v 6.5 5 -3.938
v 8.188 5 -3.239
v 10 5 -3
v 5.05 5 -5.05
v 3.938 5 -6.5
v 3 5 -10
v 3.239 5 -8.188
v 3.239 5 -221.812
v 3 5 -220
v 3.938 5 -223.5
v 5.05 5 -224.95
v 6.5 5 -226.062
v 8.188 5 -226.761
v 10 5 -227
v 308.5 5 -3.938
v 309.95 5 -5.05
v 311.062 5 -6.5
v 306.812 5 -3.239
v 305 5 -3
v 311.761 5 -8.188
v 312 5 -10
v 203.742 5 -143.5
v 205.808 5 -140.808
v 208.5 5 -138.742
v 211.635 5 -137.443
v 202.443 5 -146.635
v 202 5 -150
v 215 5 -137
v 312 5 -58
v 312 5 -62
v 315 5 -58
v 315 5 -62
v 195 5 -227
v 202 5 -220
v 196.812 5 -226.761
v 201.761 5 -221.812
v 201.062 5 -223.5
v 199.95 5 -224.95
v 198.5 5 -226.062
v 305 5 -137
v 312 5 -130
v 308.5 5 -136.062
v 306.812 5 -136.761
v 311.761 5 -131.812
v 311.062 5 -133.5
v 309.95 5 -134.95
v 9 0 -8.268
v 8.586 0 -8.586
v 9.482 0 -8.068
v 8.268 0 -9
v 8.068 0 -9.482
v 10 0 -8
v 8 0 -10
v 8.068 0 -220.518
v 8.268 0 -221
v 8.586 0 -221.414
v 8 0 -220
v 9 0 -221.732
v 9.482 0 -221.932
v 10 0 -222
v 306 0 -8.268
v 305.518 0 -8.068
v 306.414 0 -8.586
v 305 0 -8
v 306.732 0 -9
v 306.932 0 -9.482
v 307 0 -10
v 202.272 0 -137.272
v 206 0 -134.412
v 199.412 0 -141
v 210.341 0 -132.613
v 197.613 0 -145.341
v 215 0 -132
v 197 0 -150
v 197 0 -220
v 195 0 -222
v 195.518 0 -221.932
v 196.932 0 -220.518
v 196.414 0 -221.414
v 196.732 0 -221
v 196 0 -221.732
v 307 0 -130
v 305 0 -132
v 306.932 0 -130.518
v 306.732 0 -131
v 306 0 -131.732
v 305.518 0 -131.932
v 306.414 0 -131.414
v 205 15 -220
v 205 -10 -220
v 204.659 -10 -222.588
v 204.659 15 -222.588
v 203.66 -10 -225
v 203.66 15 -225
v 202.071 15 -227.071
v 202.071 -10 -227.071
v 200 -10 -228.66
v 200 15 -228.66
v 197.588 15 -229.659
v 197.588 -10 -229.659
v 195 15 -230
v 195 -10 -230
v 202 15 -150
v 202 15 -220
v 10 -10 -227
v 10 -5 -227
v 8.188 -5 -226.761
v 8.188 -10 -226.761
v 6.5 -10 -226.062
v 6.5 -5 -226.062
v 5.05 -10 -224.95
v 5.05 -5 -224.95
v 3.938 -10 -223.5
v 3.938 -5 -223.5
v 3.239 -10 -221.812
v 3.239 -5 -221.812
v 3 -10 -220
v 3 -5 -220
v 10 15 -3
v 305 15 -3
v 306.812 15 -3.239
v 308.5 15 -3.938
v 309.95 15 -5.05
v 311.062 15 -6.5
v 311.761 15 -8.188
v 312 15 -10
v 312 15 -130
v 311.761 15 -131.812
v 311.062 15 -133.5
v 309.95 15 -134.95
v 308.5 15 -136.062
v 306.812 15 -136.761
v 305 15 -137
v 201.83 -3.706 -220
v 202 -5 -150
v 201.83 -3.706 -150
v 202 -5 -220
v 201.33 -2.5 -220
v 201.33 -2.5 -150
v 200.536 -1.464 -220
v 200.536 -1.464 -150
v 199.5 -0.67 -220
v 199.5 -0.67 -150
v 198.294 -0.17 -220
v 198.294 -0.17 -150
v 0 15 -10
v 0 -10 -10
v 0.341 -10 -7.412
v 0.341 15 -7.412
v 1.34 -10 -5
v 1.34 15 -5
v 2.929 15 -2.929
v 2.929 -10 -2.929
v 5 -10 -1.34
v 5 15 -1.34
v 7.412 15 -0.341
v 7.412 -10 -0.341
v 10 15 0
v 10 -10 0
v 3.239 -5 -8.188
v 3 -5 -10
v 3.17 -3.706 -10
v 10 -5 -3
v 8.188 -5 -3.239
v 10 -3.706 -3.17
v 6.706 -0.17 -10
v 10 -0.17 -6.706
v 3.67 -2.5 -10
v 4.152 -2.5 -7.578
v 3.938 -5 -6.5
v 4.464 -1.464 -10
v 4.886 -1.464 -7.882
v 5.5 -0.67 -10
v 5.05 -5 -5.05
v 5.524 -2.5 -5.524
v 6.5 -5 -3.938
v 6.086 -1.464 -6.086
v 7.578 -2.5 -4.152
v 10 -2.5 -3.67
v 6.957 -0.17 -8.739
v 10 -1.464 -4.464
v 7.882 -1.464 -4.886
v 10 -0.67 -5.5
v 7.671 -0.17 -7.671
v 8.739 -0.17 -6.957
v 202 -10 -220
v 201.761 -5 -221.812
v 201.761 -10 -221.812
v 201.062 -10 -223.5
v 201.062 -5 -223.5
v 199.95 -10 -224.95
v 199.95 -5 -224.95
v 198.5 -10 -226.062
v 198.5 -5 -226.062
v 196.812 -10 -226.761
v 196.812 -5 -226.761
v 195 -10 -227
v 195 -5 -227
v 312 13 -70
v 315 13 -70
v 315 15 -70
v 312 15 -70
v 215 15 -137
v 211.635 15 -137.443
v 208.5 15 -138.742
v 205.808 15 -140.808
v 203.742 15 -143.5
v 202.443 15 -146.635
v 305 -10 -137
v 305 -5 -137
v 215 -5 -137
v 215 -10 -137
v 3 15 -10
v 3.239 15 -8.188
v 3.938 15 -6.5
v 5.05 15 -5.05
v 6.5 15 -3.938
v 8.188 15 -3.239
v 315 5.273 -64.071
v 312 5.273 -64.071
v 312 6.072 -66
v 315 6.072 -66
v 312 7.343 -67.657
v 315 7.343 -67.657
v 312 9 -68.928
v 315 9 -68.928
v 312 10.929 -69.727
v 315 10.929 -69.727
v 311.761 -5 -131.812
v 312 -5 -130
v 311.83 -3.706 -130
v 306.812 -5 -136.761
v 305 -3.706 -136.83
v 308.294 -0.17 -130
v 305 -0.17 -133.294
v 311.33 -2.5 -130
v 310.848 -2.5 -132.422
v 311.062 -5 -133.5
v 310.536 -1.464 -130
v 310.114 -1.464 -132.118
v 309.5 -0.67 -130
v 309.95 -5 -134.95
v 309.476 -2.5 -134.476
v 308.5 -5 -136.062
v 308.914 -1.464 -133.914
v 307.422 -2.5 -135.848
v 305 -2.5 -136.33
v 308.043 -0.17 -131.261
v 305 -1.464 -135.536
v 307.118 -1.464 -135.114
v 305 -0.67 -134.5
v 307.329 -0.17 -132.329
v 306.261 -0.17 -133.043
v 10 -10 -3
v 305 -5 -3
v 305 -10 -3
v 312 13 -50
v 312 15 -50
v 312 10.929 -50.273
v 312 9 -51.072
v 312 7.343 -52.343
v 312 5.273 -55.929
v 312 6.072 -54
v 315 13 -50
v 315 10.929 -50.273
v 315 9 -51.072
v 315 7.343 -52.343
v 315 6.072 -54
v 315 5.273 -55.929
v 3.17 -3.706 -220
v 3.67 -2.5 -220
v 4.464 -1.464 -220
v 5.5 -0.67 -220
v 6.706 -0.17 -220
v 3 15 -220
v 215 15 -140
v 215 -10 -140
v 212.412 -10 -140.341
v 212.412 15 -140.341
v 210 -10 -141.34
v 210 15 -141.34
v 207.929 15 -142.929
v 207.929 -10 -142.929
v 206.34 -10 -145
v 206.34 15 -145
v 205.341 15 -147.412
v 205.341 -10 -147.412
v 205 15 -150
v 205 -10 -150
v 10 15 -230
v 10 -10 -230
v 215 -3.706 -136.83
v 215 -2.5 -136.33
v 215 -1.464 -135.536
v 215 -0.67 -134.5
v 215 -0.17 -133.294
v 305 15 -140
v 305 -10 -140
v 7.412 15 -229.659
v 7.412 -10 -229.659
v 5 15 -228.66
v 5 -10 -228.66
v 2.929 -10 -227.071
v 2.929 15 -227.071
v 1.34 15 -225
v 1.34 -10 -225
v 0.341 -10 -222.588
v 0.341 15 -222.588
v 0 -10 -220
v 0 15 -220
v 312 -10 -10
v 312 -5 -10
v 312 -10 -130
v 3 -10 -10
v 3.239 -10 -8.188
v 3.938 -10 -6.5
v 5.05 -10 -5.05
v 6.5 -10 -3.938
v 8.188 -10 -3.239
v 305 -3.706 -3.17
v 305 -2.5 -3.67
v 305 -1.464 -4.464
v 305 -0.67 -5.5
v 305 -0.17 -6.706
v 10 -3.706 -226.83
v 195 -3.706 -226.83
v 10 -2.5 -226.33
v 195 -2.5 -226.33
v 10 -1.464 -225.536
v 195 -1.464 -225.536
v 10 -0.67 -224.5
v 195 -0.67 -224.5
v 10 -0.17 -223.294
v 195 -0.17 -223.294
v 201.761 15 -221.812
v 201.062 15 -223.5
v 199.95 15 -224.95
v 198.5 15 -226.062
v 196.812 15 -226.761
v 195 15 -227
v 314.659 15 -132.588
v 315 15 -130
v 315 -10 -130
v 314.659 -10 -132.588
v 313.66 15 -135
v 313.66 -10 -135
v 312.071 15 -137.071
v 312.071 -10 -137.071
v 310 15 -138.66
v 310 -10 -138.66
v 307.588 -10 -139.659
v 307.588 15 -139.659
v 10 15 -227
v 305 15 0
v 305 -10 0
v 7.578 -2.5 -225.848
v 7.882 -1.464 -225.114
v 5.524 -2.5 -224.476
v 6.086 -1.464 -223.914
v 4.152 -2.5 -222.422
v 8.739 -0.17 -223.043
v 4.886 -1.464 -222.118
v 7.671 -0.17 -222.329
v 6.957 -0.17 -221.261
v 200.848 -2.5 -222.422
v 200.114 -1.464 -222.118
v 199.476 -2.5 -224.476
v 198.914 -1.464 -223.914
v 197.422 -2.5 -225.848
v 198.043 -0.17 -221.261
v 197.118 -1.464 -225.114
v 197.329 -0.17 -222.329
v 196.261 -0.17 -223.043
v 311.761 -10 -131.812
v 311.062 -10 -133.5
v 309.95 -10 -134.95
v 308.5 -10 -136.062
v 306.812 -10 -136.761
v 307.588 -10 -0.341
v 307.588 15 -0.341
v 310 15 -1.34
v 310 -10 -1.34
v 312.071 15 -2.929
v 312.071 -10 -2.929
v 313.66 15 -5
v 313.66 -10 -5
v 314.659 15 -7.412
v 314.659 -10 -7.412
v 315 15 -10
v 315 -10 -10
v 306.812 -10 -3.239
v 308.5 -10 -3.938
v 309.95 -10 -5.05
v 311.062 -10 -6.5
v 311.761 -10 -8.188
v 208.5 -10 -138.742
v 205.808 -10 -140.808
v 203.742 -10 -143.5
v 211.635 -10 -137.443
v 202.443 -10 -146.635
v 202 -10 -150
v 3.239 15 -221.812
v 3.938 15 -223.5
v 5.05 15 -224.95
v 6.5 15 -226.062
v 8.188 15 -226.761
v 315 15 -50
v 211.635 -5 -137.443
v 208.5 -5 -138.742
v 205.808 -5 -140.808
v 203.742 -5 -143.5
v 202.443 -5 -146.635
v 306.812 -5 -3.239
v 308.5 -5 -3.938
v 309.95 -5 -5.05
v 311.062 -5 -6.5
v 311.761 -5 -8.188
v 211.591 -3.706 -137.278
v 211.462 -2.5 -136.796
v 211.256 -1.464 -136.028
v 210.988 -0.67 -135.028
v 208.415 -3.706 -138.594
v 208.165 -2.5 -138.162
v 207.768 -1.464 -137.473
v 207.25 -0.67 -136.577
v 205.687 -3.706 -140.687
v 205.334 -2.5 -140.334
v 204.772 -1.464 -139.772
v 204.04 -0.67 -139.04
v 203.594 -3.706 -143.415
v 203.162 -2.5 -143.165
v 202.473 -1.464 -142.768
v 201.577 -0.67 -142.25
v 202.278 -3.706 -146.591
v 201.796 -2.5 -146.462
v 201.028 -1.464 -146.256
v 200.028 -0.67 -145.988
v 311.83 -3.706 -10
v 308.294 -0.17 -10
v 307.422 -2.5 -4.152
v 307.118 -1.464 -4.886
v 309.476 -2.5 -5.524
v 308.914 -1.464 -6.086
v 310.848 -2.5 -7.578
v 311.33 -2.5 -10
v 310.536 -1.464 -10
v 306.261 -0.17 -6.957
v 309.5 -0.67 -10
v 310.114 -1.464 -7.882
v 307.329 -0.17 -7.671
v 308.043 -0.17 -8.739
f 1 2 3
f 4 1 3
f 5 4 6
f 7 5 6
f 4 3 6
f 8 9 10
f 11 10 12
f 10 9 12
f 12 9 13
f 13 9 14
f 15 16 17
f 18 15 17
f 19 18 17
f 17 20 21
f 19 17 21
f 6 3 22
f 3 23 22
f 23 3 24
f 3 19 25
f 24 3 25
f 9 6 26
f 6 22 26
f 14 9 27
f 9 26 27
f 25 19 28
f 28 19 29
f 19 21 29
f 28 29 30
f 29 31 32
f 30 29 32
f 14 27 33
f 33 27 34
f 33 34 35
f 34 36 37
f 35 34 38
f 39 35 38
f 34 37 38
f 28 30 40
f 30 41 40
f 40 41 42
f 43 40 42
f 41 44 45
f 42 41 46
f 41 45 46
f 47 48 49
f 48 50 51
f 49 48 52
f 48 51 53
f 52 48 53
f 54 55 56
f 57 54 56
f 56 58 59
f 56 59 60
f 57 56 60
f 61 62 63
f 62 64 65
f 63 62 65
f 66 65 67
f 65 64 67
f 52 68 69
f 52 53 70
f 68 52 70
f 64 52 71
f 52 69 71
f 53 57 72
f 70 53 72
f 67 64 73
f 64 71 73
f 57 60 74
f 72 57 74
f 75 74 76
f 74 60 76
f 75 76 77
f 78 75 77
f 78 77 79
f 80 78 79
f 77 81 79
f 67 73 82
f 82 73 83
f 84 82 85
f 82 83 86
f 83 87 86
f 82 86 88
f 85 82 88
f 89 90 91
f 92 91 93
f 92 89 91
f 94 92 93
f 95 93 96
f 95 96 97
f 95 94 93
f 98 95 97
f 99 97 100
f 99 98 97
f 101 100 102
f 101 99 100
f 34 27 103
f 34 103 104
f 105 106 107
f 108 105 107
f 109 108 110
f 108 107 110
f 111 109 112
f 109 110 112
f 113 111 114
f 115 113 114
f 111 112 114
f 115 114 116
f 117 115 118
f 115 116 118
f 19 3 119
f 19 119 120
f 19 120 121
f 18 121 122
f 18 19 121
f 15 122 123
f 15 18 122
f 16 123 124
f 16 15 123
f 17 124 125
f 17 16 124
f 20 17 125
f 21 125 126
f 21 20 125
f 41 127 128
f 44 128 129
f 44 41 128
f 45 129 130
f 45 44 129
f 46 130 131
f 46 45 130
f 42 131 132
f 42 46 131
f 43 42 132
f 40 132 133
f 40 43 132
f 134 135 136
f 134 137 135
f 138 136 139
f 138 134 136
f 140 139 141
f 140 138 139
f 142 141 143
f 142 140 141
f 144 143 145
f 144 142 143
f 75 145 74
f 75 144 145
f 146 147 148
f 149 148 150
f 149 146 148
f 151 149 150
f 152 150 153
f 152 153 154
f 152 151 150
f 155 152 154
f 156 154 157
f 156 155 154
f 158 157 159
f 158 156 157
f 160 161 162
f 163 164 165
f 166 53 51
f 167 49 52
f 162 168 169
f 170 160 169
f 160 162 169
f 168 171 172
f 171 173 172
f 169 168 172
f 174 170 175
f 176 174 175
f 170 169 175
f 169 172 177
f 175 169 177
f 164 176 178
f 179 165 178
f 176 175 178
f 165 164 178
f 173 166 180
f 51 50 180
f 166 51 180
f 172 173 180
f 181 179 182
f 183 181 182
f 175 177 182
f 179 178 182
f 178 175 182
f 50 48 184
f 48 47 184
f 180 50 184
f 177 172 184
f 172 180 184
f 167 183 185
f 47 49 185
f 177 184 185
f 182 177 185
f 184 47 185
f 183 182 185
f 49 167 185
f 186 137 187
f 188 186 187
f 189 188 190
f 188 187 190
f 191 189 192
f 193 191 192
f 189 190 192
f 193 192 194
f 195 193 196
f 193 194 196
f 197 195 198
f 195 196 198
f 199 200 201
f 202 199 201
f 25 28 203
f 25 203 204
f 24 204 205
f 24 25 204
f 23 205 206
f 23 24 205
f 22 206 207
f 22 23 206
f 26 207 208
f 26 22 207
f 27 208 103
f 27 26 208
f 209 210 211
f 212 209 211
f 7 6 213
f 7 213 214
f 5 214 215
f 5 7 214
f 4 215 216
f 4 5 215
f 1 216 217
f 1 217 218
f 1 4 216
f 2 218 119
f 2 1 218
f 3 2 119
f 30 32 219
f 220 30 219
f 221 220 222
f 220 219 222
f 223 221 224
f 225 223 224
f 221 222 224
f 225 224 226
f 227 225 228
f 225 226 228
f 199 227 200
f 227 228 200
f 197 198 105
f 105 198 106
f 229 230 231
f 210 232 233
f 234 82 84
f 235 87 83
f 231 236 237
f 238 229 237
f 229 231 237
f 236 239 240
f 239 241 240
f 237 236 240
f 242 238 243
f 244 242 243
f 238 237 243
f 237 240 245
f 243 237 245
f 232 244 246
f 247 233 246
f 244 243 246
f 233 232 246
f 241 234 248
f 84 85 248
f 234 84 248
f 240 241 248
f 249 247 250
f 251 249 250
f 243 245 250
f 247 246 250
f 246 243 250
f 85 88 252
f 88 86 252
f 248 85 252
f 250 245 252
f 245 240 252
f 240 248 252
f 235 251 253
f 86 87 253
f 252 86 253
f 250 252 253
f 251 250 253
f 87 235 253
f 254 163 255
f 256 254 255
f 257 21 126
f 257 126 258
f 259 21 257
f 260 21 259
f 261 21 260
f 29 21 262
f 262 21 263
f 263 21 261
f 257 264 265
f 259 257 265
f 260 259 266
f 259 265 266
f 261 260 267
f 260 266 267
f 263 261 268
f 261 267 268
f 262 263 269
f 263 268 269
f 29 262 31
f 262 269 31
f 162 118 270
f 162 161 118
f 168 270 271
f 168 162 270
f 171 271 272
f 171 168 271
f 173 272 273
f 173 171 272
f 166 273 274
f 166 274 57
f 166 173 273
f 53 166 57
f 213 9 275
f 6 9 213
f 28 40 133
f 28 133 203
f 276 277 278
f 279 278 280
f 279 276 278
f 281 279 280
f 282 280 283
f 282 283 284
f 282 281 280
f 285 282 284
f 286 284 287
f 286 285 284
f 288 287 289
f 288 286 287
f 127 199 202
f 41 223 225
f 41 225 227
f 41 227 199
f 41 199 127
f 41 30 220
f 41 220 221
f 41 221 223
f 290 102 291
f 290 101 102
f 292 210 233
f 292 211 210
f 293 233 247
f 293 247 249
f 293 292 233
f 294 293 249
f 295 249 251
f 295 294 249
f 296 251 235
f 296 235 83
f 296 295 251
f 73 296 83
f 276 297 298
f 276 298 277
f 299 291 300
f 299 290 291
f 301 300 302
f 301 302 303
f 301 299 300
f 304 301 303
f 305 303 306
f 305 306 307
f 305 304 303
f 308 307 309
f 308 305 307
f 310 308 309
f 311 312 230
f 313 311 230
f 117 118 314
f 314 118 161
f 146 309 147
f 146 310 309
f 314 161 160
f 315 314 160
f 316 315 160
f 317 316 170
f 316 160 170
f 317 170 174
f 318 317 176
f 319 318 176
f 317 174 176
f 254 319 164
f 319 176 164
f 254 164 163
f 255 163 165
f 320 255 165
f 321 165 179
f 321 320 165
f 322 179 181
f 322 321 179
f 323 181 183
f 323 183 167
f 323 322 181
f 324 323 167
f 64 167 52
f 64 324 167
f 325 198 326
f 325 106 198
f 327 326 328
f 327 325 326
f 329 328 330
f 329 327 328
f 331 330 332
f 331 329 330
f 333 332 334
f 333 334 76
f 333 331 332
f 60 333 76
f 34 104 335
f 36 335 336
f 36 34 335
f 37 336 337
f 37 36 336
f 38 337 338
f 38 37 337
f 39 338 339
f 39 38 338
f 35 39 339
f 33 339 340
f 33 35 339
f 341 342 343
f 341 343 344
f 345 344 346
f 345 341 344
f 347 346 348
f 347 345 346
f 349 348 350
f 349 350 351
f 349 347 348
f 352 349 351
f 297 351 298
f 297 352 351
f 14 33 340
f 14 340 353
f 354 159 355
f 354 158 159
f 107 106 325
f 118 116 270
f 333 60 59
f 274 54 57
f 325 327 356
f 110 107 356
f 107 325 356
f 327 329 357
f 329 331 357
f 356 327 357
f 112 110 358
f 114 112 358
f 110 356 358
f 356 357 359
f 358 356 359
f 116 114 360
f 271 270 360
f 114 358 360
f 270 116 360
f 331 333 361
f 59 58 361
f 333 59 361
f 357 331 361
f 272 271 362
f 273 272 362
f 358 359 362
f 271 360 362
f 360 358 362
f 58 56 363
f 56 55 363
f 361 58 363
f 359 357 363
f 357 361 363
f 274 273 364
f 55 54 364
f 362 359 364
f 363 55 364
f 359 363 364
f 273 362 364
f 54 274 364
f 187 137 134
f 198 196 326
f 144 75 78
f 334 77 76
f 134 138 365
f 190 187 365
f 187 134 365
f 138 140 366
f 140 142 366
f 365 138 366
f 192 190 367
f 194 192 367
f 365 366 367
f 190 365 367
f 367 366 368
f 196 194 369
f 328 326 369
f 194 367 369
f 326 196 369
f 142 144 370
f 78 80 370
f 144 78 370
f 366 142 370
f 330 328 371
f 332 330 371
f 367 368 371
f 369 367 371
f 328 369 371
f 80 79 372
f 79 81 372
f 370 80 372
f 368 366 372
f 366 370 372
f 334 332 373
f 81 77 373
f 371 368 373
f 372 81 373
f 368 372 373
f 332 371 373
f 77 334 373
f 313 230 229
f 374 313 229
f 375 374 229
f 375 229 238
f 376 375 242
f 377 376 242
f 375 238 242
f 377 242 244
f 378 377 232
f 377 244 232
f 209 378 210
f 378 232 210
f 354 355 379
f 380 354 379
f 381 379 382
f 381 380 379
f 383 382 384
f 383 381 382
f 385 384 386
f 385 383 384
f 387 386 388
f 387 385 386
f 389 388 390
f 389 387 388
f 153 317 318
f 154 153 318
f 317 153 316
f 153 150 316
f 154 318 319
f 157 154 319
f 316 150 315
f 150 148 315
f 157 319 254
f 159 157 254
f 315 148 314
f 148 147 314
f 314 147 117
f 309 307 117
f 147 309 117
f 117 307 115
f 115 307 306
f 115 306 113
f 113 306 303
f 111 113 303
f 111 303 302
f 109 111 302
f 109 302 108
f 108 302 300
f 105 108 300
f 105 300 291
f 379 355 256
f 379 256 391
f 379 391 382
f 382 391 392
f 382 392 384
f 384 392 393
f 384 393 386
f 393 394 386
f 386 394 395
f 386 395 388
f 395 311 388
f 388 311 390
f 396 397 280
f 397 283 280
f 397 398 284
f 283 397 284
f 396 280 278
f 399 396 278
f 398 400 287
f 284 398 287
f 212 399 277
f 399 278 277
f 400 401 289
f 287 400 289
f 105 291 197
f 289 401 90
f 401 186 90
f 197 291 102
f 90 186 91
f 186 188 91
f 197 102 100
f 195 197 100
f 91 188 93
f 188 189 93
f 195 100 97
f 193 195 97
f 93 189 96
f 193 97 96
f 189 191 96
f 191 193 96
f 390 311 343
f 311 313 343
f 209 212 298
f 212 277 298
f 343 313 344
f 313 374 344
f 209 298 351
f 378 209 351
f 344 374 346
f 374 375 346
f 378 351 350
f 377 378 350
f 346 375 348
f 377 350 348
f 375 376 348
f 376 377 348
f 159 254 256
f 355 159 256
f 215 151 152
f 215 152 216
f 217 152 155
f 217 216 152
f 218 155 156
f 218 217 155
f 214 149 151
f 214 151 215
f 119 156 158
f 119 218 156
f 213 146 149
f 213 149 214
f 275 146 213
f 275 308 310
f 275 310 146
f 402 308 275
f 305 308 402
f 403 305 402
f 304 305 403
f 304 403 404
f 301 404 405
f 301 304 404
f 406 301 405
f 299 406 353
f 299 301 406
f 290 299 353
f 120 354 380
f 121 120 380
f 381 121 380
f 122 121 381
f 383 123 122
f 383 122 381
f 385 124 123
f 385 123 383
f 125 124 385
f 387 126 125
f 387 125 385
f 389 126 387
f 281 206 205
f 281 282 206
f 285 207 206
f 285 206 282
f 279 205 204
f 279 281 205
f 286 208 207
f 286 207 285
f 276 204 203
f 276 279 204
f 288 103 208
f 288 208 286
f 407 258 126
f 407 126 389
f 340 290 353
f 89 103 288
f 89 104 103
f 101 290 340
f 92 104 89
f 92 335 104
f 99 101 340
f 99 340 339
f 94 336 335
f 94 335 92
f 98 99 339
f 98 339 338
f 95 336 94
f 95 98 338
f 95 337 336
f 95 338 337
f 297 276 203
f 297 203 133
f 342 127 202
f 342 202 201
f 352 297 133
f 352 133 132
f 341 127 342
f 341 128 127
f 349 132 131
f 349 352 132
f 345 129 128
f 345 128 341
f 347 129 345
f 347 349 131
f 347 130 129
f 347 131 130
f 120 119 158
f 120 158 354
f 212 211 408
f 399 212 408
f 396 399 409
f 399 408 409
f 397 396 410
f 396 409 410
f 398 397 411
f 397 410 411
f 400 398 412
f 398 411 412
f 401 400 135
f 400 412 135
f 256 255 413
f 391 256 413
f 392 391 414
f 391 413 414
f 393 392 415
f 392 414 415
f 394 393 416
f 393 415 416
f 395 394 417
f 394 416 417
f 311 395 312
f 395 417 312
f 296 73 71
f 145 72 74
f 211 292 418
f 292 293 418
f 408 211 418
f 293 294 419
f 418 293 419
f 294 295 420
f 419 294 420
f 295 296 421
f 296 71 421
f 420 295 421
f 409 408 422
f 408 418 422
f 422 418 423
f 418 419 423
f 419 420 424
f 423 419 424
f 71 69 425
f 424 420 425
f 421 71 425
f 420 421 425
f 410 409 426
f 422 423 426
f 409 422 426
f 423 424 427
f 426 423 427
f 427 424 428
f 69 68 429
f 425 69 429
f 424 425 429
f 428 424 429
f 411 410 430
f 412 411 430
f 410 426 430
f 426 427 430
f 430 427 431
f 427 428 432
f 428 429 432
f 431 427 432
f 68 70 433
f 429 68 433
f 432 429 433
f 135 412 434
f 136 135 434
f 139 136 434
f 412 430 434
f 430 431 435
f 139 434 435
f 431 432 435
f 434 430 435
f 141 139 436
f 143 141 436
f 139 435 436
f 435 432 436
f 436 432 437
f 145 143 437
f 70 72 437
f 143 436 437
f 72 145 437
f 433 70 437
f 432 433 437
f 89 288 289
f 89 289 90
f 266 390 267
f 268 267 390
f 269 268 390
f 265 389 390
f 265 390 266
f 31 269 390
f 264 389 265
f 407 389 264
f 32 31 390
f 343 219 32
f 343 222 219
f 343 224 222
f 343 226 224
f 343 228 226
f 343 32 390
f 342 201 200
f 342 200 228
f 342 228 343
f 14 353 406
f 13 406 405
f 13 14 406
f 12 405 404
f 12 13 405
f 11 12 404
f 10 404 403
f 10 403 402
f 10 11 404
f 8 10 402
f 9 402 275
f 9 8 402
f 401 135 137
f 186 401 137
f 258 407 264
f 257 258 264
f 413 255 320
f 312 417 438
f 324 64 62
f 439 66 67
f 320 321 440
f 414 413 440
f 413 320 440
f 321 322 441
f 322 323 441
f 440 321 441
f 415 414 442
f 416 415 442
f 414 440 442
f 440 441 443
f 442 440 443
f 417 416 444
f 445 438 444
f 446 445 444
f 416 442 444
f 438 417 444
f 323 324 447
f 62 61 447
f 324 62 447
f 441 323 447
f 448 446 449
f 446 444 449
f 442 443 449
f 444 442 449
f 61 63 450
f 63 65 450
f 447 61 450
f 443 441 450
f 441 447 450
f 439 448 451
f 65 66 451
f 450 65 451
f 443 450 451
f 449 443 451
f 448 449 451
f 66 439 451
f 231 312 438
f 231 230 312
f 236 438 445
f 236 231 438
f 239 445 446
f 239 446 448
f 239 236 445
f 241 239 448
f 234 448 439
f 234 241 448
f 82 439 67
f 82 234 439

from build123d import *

# Parameters (mm, degrees)
BOSS_EXTRUDE1_DEPTH      = 5
BOSS_EXTRUDE2_DEPTH      = 15
BOSS_EXTRUDE2_DEPTH_BACK = 10
CUT_EXTRUDE1_DEPTH       = 10
FILLET1_R                = 5


with BuildPart() as part:
    # Sketch1 → Boss-Extrude1 (new body)
    with BuildSketch(Plane(origin=(0, 0, 0), x_dir=(1, 0, 0), z_dir=(0, 1, 0))):
        with BuildLine():
            Line((305, 140), (215, 140))
            ThreePointArc((215, 140), (207.928932188, 142.928932188), (205, 150))
            Line((205, 150), (205, 220))
            ThreePointArc((205, 220), (202.071067812, 227.071067812), (195, 230))
            Line((195, 230), (10, 230))
            ThreePointArc((10, 230), (2.928932188, 227.071067812), (0, 220))
            Line((0, 220), (0, 10))
            ThreePointArc((0, 10), (2.928932188, 2.928932188), (10, 0))
            Line((10, 0), (305, 0))
            ThreePointArc((305, 0), (312.071067812, 2.928932188), (315, 10))
            Line((315, 10), (315, 130))
            ThreePointArc((315, 130), (312.071067812, 137.071067812), (305, 140))
        make_face()
    extrude(amount=BOSS_EXTRUDE1_DEPTH)

    # Sketch3 → Boss-Extrude2 (add, two sides)
    with BuildSketch(Plane(origin=(0, 0, 0), x_dir=(1, 0, 0), z_dir=(0, 1, 0))) as boss_extrude2_sk:
        with BuildLine():
            Line((10, 0), (305, 0))
            ThreePointArc((305, 0), (312.071067812, 2.928932188), (315, 10))
            Line((315, 10), (315, 130))
            ThreePointArc((315, 130), (312.071067812, 137.071067812), (305, 140))
            Line((305, 140), (215, 140))
            ThreePointArc((215, 140), (207.928932188, 142.928932188), (205, 150))
            Line((205, 150), (205, 220))
            ThreePointArc((205, 220), (202.071067812, 227.071067812), (195, 230))
            Line((195, 230), (10, 230))
            ThreePointArc((10, 230), (2.928932188, 227.071067812), (0, 220))
            Line((0, 220), (0, 10))
            ThreePointArc((0, 10), (2.928932188, 2.928932188), (10, 0))
        make_face()
        with BuildLine():
            Line((10, 3), (305, 3))
            ThreePointArc((305, 3), (309.949747468, 5.050252532), (312, 10))
            Line((312, 10), (312, 130))
            ThreePointArc((312, 130), (309.949747468, 134.949747468), (305, 137))
            Line((305, 137), (215, 137))
            ThreePointArc((215, 137), (205.807611845, 140.807611845), (202, 150))
            Line((202, 150), (202, 220))
            ThreePointArc((202, 220), (199.949747468, 224.949747468), (195, 227))
            Line((195, 227), (10, 227))
            ThreePointArc((10, 227), (5.050252532, 224.949747468), (3, 220))
            Line((3, 220), (3, 10))
            ThreePointArc((3, 10), (5.050252532, 5.050252532), (10, 3))
        make_face(mode=Mode.SUBTRACT)
    extrude(amount=BOSS_EXTRUDE2_DEPTH)
    extrude(boss_extrude2_sk.sketch, amount=-BOSS_EXTRUDE2_DEPTH_BACK)

    # Sketch4 → Cut-Extrude1 (cut)
    with BuildSketch(Plane(origin=(315, 0, 0), x_dir=(0, 0, -1), z_dir=(1, 0, 0))):
        with BuildLine():
            Line((50, 15), (50, 13))
            ThreePointArc((50, 13), (52.343145751, 7.343145751), (58, 5))
            Line((58, 5), (62, 5))
            ThreePointArc((62, 5), (67.656854249, 7.343145751), (70, 13))
            Line((70, 13), (70, 15))
            Line((70, 15), (50, 15))
        make_face()
    extrude(amount=-CUT_EXTRUDE1_DEPTH, mode=Mode.SUBTRACT)

    # Fillet1
    fillet1_edges = [part.edges().sort_by_distance(p)[0] for p in [
        (157.5, 0, -3),
        (309.949747468, 0, -5.050252532),
        (312, 0, -70),
        (309.949747468, 0, -134.949747468),
        (260, 0, -137),
        (205.807611845, 0, -140.807611845),
        (202, 0, -185),
        (199.949747468, 0, -224.949747468),
        (102.5, 0, -227),
        (5.050252532, 0, -224.949747468),
        (3, 0, -115),
        (5.050252532, 0, -5.050252532),
    ]]
    fillet(fillet1_edges, radius=FILLET1_R)


solid = part.part
